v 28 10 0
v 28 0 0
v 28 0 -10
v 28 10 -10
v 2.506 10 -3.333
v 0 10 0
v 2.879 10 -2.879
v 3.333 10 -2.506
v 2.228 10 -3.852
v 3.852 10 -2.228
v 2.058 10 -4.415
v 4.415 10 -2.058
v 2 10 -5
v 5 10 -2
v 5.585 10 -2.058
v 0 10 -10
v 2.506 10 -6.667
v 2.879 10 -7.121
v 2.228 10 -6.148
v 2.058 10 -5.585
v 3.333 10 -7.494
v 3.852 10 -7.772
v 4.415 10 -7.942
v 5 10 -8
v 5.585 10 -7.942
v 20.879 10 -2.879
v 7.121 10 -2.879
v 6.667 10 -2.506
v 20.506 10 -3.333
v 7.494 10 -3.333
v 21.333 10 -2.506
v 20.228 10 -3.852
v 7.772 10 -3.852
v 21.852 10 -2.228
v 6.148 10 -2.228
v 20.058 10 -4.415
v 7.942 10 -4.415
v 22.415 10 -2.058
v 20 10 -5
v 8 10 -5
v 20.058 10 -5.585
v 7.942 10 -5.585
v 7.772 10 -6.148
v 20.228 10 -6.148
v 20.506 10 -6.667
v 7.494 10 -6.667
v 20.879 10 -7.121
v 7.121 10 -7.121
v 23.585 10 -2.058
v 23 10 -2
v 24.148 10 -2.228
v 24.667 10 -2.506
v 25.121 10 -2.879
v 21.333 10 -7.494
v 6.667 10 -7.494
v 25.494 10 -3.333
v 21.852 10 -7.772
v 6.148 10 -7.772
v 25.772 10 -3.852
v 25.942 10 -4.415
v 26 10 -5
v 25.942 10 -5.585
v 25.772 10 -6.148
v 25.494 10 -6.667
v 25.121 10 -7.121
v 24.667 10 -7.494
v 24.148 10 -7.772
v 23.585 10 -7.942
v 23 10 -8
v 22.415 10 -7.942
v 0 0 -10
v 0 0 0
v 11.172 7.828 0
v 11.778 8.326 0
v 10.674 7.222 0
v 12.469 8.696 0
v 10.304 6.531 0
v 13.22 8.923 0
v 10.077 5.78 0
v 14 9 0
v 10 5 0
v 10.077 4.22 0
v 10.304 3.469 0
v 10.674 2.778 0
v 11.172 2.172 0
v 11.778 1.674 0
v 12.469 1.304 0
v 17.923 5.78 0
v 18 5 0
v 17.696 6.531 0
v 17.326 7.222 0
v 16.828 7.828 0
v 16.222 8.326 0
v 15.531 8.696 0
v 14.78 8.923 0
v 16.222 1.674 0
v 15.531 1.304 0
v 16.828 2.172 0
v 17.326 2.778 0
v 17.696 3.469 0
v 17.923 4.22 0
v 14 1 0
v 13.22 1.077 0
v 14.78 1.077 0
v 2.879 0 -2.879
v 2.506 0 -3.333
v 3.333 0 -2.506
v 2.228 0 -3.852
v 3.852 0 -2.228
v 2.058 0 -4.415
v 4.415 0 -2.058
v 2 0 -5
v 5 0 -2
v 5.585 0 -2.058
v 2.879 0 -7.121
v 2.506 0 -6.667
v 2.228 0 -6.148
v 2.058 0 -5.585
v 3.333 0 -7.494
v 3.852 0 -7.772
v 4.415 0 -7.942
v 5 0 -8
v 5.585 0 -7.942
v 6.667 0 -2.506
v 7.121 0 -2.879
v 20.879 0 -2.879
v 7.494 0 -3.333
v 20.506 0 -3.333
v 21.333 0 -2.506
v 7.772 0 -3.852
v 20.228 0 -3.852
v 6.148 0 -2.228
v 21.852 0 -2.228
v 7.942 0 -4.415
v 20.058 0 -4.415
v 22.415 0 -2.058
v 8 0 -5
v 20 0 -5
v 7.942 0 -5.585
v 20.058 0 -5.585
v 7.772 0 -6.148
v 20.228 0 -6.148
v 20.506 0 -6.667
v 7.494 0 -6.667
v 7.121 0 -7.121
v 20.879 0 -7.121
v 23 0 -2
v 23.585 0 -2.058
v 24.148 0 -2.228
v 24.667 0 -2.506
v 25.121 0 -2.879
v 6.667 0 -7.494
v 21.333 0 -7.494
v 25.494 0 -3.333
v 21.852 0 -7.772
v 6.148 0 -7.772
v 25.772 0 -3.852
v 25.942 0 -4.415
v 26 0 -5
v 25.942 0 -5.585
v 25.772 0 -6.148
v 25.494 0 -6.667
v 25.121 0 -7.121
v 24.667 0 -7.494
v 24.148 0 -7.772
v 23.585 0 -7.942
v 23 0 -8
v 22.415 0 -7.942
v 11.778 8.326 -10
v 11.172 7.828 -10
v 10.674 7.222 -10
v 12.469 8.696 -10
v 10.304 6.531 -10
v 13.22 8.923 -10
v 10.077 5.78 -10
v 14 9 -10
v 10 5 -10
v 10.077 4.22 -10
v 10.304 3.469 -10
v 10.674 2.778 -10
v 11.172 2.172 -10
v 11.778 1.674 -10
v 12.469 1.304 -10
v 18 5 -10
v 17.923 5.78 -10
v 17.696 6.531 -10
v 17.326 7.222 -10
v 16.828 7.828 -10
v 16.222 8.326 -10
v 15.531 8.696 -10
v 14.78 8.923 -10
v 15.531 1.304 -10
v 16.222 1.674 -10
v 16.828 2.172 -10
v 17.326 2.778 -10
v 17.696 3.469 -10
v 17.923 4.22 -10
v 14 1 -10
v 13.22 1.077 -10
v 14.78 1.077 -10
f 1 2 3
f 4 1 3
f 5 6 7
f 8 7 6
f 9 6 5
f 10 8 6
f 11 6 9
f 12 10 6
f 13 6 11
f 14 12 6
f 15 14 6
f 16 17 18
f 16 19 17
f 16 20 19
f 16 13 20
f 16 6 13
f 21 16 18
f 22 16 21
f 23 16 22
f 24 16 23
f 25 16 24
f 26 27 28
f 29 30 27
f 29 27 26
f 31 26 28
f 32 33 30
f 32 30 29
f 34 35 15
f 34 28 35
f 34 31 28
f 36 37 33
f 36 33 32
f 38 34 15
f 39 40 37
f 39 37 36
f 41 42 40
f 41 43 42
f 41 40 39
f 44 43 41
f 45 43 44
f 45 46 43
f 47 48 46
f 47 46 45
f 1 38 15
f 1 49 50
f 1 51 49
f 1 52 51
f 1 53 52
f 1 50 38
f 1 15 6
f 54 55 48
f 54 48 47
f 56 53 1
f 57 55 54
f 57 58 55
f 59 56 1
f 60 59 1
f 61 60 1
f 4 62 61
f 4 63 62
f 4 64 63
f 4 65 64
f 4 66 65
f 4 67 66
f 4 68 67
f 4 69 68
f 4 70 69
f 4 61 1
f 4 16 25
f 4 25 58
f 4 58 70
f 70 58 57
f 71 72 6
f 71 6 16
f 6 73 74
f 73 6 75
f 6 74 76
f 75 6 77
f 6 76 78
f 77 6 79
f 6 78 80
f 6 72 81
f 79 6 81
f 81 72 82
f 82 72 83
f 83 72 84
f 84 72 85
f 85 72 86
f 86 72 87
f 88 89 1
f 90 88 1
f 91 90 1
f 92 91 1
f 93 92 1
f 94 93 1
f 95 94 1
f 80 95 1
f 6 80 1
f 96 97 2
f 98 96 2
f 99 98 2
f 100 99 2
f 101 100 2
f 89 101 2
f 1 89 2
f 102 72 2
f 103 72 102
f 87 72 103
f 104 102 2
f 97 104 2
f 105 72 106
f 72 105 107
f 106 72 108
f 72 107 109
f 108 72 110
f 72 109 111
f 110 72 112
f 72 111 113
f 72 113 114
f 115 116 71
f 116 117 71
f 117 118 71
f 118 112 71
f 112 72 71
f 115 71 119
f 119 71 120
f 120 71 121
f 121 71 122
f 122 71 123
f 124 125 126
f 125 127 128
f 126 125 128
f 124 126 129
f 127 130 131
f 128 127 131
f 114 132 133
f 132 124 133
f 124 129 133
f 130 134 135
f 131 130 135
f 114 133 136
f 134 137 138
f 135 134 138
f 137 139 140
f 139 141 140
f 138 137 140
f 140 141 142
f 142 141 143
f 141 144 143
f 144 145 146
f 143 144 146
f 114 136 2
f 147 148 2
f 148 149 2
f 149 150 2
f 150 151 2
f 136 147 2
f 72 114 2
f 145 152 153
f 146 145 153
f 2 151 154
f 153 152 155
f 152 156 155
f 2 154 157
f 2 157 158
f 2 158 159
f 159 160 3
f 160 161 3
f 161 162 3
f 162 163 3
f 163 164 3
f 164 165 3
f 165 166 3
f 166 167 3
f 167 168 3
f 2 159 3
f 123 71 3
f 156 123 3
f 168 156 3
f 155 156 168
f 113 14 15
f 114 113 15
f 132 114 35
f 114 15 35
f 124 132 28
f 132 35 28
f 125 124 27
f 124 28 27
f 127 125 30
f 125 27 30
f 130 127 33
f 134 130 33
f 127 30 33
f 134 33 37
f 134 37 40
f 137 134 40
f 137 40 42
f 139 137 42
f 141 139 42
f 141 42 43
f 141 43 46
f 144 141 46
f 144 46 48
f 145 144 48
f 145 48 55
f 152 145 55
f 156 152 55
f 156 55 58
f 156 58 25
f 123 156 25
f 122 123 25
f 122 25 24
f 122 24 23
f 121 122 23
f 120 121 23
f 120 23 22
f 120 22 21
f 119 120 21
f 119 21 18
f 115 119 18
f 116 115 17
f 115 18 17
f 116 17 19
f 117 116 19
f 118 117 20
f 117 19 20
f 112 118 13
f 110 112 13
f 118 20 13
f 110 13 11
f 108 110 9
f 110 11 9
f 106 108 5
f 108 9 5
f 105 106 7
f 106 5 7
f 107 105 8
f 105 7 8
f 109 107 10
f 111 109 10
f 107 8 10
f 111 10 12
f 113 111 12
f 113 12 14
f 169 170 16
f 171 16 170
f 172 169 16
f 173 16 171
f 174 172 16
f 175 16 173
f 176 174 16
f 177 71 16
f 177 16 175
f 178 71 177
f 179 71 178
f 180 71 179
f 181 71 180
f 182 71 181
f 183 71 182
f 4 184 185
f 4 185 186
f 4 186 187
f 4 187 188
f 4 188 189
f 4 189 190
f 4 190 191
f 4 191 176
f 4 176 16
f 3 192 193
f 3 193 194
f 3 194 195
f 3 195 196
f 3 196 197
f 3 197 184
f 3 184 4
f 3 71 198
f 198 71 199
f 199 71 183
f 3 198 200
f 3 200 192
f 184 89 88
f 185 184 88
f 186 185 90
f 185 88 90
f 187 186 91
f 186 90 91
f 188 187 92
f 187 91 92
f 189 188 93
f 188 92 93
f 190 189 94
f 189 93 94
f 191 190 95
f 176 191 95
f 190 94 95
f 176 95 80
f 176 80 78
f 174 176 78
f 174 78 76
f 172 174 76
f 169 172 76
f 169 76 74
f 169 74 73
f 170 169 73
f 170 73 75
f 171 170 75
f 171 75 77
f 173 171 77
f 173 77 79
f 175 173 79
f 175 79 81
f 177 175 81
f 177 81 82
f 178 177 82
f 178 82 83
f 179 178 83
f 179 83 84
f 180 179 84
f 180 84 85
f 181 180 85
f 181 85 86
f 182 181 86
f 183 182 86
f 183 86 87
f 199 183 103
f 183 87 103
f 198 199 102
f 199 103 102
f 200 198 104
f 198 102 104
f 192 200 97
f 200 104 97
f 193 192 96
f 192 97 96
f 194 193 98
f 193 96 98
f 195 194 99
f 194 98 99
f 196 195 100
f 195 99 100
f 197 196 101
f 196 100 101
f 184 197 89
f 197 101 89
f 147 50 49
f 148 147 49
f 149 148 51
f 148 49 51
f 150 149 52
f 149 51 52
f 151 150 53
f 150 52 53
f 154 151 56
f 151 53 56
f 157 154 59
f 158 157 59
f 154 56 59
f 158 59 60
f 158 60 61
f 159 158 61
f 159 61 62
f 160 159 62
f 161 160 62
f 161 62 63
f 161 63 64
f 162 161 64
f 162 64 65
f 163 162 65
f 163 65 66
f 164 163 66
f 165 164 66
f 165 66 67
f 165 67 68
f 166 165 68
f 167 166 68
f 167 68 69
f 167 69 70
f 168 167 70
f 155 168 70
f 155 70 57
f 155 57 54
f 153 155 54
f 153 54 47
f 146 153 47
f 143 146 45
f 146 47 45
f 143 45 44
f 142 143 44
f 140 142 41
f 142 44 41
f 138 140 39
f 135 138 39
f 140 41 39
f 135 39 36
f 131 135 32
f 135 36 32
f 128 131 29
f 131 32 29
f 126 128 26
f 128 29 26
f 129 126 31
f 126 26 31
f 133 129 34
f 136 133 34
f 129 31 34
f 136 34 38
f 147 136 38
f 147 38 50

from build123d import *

# Parameters (mm, degrees)
ESQUISSE1_W      = 28
ESQUISSE1_H      = 10
EXTRUSION1_DEPTH = 10
ESQUISSE2_R      = 4
EXTRUSION2_DEPTH = 32.368774283
ESQUISSE3_R      = 3
EXTRUSION3_DEPTH = 32.368774283


with BuildPart() as part:
    # Esquisse1 → Extrusion1 (new body)
    with BuildSketch(Plane(origin=(0, 0, 0), x_dir=(1, 0, 0), z_dir=(0, 1, 0))):
        with Locations((14, 5)):
            Rectangle(ESQUISSE1_W, ESQUISSE1_H)
    extrude(amount=EXTRUSION1_DEPTH)

    # Esquisse2 → Extrusion2 (cut, through all)
    with BuildSketch(Plane.XY):
        with Locations((14, 5)):
            Circle(ESQUISSE2_R)
    extrude(amount=-EXTRUSION2_DEPTH, mode=Mode.SUBTRACT)

    # Esquisse3 → Extrusion3 (cut, through all)
    with BuildSketch(Plane(origin=(0, 10, 0), x_dir=(1, 0, 0), z_dir=(0, 1, 0))):
        with Locations(Location((5, 5, 0), (0, 0, 270))):
            Circle(ESQUISSE3_R)
        with Locations(Location((23, 5, 0), (0, 0, 270))):
            Circle(ESQUISSE3_R)
    extrude(amount=-EXTRUSION3_DEPTH, mode=Mode.SUBTRACT)


solid = part.part
